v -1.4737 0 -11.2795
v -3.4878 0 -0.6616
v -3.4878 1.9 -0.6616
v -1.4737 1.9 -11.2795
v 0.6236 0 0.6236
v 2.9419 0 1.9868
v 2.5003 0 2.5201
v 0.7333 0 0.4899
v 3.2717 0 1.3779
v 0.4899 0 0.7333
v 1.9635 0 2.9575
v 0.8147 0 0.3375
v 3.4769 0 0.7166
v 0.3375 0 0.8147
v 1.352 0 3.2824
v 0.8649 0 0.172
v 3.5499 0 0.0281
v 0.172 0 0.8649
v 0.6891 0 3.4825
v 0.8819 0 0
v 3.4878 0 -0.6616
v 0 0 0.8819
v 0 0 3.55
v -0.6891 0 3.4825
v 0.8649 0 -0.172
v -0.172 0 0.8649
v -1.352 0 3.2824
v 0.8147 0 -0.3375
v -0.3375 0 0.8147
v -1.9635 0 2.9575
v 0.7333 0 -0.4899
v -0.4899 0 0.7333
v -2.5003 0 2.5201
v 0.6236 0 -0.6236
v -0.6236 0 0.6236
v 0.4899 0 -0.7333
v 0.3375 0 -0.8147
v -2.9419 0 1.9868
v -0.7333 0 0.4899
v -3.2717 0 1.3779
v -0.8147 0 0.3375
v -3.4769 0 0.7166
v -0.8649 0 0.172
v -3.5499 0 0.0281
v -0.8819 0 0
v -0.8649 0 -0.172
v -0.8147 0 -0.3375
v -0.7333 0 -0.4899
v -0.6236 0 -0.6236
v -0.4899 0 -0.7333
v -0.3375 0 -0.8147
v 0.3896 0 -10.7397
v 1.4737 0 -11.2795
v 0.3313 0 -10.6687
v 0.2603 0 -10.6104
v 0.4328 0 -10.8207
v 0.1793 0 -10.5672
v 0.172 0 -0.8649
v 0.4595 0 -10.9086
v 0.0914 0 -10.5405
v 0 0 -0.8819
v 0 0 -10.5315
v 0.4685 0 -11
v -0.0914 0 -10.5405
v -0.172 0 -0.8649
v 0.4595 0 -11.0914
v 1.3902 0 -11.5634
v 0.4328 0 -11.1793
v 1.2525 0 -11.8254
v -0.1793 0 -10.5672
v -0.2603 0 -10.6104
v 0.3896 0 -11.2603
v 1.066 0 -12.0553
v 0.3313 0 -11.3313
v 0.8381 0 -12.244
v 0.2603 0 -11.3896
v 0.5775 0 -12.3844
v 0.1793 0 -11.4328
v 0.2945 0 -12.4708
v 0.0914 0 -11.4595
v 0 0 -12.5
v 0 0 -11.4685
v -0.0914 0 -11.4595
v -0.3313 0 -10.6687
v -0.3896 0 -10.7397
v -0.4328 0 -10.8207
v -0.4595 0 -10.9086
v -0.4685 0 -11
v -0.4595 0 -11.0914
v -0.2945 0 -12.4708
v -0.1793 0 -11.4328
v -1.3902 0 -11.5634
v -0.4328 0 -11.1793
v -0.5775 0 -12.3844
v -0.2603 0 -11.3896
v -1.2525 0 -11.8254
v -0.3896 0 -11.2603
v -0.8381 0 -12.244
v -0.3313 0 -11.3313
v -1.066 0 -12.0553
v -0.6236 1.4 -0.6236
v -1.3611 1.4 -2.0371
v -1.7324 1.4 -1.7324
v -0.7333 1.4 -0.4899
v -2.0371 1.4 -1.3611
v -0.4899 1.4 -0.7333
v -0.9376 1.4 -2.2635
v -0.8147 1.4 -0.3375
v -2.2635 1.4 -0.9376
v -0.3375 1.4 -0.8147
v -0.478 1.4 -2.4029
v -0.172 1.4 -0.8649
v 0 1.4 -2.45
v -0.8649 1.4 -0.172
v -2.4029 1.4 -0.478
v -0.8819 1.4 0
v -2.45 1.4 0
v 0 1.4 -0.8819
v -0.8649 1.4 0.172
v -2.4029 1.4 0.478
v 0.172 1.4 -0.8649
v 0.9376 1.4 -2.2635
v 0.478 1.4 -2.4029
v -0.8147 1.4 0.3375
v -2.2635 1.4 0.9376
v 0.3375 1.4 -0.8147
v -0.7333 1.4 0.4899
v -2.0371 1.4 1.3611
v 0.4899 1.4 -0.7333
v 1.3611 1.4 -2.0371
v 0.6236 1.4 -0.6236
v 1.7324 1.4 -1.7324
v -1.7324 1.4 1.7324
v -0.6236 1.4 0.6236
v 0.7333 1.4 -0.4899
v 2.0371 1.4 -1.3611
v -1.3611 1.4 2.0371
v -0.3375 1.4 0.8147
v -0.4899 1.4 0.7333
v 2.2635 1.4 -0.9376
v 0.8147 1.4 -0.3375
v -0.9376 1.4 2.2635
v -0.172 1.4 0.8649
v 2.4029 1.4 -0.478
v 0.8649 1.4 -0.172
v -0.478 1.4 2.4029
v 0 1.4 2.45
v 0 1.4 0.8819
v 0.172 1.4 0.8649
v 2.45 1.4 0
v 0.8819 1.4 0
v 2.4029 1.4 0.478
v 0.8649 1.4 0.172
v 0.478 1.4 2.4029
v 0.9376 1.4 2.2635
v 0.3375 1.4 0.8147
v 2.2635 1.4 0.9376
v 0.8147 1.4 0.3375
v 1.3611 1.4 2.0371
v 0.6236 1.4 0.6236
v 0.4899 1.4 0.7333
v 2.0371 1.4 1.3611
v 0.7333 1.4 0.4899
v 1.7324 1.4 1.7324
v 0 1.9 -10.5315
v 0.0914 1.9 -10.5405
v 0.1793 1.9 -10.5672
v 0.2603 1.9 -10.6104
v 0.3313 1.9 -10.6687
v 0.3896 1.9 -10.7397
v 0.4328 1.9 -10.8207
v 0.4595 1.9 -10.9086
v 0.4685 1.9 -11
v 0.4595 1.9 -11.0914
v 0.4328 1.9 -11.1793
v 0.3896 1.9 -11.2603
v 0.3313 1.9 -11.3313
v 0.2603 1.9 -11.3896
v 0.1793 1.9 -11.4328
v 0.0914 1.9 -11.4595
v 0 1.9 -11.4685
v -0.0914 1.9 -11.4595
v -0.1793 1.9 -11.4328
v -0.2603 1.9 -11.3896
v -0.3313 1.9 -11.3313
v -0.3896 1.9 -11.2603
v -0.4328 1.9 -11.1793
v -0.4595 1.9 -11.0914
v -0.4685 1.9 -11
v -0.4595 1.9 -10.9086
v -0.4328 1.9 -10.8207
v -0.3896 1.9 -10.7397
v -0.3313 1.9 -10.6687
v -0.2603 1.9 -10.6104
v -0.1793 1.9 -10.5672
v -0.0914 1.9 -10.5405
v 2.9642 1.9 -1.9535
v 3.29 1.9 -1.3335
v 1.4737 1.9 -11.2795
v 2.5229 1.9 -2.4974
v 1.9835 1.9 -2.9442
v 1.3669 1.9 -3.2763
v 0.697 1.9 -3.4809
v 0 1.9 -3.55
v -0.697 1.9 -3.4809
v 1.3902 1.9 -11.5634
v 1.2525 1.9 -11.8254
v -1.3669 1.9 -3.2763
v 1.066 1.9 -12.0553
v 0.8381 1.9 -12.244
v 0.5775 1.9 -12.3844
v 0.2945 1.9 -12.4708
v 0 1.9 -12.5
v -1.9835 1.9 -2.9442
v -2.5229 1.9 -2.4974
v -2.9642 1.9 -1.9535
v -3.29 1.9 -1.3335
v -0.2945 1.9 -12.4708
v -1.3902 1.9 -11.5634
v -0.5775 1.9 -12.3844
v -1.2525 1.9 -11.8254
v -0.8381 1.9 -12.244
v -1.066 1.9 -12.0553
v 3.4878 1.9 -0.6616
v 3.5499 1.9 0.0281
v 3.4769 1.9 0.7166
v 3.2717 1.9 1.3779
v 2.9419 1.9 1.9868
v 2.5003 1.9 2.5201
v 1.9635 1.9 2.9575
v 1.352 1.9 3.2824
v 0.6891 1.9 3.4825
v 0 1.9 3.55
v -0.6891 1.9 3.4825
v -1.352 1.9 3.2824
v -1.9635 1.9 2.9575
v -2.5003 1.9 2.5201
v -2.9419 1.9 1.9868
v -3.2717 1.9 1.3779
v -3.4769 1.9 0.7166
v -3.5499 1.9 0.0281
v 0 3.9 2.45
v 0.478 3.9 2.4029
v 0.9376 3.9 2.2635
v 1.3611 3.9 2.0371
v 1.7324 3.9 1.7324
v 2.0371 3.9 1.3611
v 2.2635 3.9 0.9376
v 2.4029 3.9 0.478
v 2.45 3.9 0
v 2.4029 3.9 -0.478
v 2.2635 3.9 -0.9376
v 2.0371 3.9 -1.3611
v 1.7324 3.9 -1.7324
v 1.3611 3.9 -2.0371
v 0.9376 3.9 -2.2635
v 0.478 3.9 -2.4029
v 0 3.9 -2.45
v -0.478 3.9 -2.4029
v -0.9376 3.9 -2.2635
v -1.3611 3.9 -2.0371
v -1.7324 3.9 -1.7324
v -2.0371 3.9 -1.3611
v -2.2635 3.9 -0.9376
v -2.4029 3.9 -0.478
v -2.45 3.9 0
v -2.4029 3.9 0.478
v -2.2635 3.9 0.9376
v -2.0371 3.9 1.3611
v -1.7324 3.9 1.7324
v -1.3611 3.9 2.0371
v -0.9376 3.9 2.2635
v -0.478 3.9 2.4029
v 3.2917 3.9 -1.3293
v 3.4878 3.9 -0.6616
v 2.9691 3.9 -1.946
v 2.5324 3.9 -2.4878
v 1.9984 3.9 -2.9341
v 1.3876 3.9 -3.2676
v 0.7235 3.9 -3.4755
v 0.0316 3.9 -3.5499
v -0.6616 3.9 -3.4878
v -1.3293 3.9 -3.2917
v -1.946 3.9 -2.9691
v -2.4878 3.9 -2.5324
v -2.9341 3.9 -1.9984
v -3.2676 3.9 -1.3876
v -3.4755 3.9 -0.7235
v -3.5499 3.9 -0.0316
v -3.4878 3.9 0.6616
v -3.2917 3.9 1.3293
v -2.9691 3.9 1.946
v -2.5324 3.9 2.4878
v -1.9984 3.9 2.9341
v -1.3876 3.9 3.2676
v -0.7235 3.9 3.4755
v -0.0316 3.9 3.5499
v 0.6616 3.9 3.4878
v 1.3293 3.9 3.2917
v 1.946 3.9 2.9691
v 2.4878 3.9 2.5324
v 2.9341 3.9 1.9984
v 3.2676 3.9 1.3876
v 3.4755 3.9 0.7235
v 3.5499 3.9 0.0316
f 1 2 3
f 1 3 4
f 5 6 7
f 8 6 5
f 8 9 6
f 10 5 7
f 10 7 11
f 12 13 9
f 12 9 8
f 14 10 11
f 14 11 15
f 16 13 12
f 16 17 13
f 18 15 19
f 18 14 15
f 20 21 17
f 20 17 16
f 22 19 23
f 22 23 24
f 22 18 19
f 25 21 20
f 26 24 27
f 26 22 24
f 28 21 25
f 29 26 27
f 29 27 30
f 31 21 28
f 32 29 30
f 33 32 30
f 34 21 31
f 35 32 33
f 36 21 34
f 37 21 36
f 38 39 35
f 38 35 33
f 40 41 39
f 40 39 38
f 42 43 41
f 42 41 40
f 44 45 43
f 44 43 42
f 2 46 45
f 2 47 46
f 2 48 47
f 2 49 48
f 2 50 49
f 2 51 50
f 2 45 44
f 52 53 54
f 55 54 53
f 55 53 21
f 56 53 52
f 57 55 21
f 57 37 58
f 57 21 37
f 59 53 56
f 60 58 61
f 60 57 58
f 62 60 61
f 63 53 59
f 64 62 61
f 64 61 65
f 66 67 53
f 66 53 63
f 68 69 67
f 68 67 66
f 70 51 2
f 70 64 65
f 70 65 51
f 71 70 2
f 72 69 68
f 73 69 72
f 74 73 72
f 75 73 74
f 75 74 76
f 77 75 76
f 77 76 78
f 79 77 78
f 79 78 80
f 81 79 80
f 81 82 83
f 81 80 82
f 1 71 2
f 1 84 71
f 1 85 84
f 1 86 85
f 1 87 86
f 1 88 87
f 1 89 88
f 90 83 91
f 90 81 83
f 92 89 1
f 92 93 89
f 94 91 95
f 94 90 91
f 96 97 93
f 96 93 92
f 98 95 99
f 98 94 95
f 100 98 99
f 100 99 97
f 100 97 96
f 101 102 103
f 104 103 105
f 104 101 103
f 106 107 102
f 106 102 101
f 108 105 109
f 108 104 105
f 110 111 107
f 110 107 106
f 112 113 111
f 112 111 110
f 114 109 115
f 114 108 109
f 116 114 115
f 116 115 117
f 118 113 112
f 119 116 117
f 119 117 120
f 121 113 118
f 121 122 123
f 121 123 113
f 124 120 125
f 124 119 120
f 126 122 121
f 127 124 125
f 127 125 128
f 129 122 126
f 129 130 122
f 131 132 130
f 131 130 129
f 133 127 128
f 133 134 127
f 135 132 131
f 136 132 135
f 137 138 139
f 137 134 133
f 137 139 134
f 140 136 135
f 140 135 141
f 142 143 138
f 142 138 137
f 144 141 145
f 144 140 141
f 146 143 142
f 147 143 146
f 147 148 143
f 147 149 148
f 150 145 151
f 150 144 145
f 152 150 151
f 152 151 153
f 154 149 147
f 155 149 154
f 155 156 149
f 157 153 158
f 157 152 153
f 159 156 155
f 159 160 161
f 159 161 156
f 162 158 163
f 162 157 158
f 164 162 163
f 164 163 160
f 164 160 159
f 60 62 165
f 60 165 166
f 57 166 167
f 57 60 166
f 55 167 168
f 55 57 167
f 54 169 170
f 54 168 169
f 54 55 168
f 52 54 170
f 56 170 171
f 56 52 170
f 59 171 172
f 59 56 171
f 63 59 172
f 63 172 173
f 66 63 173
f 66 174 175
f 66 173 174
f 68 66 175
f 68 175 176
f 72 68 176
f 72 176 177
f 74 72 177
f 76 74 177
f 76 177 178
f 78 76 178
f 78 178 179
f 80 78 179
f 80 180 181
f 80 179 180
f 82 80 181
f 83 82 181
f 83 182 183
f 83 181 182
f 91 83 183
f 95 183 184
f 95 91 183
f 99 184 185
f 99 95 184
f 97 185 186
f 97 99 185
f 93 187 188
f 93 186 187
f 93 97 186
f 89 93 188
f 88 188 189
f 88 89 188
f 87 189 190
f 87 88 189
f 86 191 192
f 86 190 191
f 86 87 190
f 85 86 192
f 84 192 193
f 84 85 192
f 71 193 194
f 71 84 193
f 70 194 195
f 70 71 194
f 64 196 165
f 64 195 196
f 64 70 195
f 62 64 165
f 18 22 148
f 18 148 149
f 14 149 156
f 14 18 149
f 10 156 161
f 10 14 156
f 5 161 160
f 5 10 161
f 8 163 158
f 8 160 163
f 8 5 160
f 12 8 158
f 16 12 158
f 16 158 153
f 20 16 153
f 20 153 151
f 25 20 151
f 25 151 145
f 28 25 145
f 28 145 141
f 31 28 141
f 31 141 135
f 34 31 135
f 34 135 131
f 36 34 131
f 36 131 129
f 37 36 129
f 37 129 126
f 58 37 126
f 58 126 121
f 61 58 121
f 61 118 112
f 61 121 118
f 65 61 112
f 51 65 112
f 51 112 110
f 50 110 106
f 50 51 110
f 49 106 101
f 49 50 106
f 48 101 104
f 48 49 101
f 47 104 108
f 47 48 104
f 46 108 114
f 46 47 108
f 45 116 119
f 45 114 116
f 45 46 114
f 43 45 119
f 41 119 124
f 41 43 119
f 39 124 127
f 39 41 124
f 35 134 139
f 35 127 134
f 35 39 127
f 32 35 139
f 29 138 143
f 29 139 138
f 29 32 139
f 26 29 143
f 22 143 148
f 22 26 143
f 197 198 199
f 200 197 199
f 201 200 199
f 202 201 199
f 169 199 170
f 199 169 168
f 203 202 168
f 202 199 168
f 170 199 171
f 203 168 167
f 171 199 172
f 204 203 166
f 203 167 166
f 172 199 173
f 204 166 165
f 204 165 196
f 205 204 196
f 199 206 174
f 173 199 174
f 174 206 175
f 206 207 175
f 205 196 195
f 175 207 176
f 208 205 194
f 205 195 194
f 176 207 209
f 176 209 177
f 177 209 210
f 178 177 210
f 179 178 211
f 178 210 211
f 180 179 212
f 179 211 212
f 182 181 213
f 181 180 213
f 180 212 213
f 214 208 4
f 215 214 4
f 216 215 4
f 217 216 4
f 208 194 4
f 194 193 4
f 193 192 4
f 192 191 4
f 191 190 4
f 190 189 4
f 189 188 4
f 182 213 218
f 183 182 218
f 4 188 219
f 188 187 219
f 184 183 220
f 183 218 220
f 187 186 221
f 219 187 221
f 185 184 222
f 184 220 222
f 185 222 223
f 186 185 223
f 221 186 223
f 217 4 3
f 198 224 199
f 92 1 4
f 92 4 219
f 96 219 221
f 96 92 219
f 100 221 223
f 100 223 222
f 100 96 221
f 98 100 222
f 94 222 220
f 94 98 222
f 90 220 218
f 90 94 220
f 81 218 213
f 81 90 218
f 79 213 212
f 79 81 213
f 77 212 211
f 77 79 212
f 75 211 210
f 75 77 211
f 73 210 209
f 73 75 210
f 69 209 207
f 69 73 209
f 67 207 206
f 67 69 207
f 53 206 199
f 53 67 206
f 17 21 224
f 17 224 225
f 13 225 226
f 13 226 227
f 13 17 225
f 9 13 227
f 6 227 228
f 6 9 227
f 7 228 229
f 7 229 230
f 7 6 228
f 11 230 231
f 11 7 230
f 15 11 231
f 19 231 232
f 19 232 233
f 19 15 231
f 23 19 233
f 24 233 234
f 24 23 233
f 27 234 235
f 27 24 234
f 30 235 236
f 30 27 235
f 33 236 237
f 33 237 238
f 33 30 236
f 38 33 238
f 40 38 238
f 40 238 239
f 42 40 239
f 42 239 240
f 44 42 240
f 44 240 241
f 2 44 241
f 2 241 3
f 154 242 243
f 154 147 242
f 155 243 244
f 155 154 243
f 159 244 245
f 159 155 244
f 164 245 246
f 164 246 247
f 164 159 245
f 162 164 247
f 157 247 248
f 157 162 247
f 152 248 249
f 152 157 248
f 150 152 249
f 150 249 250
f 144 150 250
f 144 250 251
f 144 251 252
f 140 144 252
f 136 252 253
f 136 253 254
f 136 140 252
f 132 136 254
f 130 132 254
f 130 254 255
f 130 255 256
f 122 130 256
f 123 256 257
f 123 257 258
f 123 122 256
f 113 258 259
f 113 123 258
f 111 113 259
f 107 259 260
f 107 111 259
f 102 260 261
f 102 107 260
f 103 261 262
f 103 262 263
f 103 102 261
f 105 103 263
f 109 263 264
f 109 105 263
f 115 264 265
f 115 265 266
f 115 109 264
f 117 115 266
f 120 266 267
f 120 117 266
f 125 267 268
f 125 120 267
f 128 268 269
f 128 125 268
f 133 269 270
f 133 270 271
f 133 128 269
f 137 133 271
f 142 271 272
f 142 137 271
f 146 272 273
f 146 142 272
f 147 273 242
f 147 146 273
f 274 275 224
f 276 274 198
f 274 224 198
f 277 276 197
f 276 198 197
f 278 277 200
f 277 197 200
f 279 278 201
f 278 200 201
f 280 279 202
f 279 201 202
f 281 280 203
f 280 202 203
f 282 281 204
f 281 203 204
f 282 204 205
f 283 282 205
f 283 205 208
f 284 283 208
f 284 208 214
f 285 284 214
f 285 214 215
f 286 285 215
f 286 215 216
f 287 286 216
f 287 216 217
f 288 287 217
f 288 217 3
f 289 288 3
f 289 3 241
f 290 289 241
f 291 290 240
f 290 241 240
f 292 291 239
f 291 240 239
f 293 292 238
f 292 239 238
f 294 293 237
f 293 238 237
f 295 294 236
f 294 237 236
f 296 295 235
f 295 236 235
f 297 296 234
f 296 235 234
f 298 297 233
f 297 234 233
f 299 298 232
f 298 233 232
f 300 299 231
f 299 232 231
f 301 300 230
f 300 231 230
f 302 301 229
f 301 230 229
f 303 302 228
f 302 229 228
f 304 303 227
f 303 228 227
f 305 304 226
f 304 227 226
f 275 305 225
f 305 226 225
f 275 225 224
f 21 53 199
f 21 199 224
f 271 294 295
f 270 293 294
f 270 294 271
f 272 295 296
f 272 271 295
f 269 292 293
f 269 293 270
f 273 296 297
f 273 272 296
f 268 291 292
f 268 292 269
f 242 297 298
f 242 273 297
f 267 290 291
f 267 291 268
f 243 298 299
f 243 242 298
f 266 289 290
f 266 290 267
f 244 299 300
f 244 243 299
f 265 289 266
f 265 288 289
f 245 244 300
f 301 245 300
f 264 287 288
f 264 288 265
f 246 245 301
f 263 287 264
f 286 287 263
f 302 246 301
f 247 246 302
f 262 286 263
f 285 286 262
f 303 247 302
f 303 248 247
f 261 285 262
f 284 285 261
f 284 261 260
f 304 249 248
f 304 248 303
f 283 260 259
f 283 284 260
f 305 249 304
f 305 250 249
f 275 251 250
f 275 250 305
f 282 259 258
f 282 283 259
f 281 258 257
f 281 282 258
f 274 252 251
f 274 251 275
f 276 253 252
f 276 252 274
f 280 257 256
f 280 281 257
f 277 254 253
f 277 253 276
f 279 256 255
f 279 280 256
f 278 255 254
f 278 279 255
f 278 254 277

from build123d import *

# Parameters (mm, degrees)
BOSS_EXTRUDE1_DEPTH     = 1.9
SKETCH2_R               = 3.55
SKETCH2_R_2             = 2.45
BOSS_EXTRUDE2_DEPTH     = 2
CUT_EXTRUDE1_START      = -2.5
SKETCH3_R               = 2.45
CUT_EXTRUDE1_DEPTH      = 2.5
CUT_EXTRUDE2_DEPTH      = 14.232630124
CUT_EXTRUDE2_DEPTH_BACK = 14.232630124
SKETCH4_R               = 0.468509015
SKETCH4_R_2             = 0.881877008


with BuildPart() as part:
    # Sketch1 → Boss-Extrude1 (new body)
    with BuildSketch(Plane(origin=(0, 0, 0), x_dir=(1, 0, 0), z_dir=(0, 1, 0))):
        with BuildLine():
            Line((-3.487806971, 0.661590909), (-1.473721255, 11.279545455))
            ThreePointArc((-1.473721255, 11.279545455), (0, 12.5), (1.473721255, 11.279545455))
            Line((1.473721255, 11.279545455), (3.487806971, 0.661590909))
            ThreePointArc((3.487806971, 0.661590909), (0, -3.55), (-3.487806971, 0.661590909))
        make_face()
    extrude(amount=BOSS_EXTRUDE1_DEPTH)

    # Sketch2 → Boss-Extrude2 (add)
    with BuildSketch(Plane(origin=(0, 1.9, 0), x_dir=(1, 0, 0), z_dir=(0, 1, 0))):
        with Locations(Location((0, 0, 0), (0, 0, 10.740645756))):
            Circle(SKETCH2_R)
        with Locations(Location((0, 0, 0), (0, 0, 270))):
            Circle(SKETCH2_R_2, mode=Mode.SUBTRACT)
    extrude(amount=BOSS_EXTRUDE2_DEPTH)

    # Sketch3 → Cut-Extrude1 (cut)
    with BuildSketch(Plane(origin=(0, 3.9, 0), x_dir=(1, 0, 0), z_dir=(0, 1, 0)).offset(CUT_EXTRUDE1_START)):
        with Locations(Location((0, 0, 0), (0, 0, 270))):
            Circle(SKETCH3_R)
    extrude(amount=CUT_EXTRUDE1_DEPTH, mode=Mode.SUBTRACT)

    # Sketch4 → Cut-Extrude2 (cut, two sides: drawn at the far end of the back side and taken through both)
    with BuildSketch(Plane(origin=(0, 1.4, 0), x_dir=(1, 0, 0), z_dir=(0, 1, 0)).offset(-CUT_EXTRUDE2_DEPTH_BACK)):
        with Locations(Location((0, 11, 0), (0, 0, 270))):
            Circle(SKETCH4_R)
        with Locations(Location((0, 0, 0), (0, 0, 270))):
            Circle(SKETCH4_R_2)
    extrude(amount=CUT_EXTRUDE2_DEPTH + CUT_EXTRUDE2_DEPTH_BACK, mode=Mode.SUBTRACT)


solid = part.part
